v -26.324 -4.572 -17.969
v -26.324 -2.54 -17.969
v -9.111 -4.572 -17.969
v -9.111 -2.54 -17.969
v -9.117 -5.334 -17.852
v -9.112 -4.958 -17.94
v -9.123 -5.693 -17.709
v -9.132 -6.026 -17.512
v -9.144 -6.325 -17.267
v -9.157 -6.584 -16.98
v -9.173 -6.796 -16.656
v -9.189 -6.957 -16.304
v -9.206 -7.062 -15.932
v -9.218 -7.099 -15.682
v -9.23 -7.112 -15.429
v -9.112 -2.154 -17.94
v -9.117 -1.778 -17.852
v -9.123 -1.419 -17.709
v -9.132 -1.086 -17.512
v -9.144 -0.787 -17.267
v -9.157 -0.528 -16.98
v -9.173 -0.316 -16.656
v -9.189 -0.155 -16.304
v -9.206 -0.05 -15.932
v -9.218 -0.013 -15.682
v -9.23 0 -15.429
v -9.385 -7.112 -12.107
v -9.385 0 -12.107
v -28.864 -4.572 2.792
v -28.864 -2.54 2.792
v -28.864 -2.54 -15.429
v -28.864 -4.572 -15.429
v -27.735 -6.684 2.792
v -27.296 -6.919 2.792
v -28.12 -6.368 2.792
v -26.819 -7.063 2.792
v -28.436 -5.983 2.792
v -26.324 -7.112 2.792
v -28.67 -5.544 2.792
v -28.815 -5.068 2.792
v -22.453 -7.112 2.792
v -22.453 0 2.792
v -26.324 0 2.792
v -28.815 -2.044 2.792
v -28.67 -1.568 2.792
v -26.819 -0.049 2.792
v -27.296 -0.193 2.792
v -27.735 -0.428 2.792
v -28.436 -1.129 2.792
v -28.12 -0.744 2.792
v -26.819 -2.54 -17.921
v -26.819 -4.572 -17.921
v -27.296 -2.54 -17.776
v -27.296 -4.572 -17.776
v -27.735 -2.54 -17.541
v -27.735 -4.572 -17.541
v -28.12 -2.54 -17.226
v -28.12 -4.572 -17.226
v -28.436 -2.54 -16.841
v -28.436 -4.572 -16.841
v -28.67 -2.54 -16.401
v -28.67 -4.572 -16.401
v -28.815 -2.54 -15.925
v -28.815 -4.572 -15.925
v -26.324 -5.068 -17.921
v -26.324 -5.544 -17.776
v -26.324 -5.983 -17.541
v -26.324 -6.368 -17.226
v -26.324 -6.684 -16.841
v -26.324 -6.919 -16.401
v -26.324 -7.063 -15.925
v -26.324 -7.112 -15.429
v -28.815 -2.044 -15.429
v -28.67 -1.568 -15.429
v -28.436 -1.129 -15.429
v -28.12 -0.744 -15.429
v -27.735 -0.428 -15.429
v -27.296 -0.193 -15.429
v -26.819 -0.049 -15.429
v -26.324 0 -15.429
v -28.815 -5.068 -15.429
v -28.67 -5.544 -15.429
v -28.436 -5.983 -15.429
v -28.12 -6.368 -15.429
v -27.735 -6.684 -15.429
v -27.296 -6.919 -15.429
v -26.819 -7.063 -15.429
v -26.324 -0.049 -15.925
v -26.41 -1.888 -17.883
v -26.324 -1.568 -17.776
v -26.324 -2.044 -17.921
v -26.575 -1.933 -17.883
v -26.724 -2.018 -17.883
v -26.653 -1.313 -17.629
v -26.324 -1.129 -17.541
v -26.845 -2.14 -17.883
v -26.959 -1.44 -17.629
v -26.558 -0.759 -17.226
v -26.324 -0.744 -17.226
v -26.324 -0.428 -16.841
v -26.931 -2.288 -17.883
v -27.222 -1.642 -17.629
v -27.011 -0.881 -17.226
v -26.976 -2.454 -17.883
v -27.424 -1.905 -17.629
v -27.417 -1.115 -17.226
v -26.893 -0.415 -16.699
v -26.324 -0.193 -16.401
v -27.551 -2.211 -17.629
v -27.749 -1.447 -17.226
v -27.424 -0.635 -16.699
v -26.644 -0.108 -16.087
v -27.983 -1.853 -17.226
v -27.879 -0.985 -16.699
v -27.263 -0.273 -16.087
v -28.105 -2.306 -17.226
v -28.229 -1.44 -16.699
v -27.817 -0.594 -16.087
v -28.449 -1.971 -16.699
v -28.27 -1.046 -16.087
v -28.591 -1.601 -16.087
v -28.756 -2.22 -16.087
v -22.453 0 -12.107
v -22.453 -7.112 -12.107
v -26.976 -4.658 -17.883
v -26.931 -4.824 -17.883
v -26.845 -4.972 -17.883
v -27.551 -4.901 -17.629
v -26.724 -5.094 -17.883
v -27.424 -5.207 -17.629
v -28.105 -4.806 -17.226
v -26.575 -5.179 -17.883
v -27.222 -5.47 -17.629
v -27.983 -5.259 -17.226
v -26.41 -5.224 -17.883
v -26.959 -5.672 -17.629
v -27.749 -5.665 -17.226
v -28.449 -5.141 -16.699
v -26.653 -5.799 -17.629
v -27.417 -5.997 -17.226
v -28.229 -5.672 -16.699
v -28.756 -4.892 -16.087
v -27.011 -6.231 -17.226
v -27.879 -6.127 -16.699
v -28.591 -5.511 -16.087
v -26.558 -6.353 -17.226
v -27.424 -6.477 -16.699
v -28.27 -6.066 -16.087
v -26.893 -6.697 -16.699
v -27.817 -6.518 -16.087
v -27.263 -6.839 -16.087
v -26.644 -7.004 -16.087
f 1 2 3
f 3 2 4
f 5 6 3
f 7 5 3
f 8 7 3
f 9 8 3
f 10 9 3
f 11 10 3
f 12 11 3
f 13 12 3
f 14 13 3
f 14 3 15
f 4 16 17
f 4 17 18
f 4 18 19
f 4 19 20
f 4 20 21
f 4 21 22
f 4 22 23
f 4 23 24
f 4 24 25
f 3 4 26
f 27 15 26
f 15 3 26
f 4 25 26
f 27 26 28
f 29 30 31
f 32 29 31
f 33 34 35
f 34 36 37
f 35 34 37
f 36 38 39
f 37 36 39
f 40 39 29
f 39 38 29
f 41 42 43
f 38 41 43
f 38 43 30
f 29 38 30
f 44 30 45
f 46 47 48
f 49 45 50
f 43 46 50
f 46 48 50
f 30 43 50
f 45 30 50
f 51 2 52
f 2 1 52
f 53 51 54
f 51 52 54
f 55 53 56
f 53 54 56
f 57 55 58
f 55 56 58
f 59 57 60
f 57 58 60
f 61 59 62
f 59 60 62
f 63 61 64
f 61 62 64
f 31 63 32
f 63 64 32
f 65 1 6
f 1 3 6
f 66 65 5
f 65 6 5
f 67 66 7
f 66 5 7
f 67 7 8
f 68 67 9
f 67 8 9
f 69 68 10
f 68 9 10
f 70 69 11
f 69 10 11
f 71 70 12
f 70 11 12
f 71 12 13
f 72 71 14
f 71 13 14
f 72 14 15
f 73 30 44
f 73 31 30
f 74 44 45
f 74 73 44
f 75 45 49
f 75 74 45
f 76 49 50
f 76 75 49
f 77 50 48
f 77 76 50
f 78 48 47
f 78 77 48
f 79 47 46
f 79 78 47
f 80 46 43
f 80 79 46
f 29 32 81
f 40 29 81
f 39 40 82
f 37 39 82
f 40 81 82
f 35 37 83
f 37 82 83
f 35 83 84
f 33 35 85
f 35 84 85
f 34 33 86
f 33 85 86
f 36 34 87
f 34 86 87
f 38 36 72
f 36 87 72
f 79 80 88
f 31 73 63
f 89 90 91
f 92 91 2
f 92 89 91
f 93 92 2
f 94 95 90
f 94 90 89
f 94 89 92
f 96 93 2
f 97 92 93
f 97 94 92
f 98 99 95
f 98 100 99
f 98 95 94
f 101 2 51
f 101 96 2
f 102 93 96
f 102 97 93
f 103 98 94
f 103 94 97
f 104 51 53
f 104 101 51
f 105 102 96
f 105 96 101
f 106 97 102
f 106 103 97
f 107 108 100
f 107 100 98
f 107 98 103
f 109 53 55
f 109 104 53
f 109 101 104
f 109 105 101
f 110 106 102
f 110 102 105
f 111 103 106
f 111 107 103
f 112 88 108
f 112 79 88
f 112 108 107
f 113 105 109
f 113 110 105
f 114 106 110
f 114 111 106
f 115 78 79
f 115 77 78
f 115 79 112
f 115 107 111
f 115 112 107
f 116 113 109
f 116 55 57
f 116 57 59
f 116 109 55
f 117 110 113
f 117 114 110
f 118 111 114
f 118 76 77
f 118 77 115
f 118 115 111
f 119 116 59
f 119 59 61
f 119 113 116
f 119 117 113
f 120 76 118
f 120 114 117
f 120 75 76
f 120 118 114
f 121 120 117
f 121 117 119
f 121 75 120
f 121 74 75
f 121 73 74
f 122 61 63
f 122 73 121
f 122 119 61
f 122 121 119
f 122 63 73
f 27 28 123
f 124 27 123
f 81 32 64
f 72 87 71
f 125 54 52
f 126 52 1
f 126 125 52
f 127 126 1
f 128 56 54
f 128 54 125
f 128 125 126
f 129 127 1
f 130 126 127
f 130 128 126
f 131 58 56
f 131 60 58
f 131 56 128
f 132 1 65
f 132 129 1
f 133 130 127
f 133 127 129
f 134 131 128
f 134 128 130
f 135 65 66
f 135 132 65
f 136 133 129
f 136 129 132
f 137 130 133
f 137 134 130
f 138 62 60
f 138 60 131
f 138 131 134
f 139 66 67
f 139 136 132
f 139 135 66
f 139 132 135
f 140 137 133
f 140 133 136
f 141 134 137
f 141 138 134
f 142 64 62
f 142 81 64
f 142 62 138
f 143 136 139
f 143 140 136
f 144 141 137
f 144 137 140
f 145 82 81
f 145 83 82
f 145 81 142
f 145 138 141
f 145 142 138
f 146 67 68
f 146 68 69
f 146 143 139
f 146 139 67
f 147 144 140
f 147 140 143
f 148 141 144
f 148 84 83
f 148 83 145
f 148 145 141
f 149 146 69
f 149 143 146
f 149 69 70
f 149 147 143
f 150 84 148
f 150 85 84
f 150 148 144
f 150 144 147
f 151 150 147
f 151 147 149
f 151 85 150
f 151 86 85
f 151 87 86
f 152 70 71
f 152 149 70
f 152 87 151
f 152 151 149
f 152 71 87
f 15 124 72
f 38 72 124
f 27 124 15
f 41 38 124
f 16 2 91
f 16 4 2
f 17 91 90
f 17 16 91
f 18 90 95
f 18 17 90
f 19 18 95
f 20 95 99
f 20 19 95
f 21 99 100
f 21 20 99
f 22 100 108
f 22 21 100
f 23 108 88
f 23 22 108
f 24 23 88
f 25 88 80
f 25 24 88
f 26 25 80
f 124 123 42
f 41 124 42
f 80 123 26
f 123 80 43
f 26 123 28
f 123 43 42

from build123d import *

# Parameters (mm, degrees)
F1_DEPTH = 7.112
F2_R     = 2.54
F3_R     = 2.54


with BuildPart() as f1:
    # F0 (on Front) → F1 (new body)
    with BuildSketch(Plane.XZ):
        Polygon((-28.863836, -17.969469), (-9.111056, -17.969469), (-9.385372, -12.106972), (-22.452589, -12.106972), (-22.452589, 2.791757), (-28.863836, 2.791757), align=None)
    extrude(amount=F1_DEPTH)

    # F2
    f2_edges = [f1.edges().sort_by_distance(p)[0] for p in [
        (-28.863836, -7.112, -7.588856),
    ]]
    fillet(f2_edges, radius=F2_R)

    # F3
    f3_edges = [f1.edges().sort_by_distance(p)[0] for p in [
        (-28.863836, 0, -7.588856),
        (-18.987446, 0, -17.969469),
        (-17.717446, -7.112, -17.969469),
    ]]
    fillet(f3_edges, radius=F3_R)


solid = f1.part
